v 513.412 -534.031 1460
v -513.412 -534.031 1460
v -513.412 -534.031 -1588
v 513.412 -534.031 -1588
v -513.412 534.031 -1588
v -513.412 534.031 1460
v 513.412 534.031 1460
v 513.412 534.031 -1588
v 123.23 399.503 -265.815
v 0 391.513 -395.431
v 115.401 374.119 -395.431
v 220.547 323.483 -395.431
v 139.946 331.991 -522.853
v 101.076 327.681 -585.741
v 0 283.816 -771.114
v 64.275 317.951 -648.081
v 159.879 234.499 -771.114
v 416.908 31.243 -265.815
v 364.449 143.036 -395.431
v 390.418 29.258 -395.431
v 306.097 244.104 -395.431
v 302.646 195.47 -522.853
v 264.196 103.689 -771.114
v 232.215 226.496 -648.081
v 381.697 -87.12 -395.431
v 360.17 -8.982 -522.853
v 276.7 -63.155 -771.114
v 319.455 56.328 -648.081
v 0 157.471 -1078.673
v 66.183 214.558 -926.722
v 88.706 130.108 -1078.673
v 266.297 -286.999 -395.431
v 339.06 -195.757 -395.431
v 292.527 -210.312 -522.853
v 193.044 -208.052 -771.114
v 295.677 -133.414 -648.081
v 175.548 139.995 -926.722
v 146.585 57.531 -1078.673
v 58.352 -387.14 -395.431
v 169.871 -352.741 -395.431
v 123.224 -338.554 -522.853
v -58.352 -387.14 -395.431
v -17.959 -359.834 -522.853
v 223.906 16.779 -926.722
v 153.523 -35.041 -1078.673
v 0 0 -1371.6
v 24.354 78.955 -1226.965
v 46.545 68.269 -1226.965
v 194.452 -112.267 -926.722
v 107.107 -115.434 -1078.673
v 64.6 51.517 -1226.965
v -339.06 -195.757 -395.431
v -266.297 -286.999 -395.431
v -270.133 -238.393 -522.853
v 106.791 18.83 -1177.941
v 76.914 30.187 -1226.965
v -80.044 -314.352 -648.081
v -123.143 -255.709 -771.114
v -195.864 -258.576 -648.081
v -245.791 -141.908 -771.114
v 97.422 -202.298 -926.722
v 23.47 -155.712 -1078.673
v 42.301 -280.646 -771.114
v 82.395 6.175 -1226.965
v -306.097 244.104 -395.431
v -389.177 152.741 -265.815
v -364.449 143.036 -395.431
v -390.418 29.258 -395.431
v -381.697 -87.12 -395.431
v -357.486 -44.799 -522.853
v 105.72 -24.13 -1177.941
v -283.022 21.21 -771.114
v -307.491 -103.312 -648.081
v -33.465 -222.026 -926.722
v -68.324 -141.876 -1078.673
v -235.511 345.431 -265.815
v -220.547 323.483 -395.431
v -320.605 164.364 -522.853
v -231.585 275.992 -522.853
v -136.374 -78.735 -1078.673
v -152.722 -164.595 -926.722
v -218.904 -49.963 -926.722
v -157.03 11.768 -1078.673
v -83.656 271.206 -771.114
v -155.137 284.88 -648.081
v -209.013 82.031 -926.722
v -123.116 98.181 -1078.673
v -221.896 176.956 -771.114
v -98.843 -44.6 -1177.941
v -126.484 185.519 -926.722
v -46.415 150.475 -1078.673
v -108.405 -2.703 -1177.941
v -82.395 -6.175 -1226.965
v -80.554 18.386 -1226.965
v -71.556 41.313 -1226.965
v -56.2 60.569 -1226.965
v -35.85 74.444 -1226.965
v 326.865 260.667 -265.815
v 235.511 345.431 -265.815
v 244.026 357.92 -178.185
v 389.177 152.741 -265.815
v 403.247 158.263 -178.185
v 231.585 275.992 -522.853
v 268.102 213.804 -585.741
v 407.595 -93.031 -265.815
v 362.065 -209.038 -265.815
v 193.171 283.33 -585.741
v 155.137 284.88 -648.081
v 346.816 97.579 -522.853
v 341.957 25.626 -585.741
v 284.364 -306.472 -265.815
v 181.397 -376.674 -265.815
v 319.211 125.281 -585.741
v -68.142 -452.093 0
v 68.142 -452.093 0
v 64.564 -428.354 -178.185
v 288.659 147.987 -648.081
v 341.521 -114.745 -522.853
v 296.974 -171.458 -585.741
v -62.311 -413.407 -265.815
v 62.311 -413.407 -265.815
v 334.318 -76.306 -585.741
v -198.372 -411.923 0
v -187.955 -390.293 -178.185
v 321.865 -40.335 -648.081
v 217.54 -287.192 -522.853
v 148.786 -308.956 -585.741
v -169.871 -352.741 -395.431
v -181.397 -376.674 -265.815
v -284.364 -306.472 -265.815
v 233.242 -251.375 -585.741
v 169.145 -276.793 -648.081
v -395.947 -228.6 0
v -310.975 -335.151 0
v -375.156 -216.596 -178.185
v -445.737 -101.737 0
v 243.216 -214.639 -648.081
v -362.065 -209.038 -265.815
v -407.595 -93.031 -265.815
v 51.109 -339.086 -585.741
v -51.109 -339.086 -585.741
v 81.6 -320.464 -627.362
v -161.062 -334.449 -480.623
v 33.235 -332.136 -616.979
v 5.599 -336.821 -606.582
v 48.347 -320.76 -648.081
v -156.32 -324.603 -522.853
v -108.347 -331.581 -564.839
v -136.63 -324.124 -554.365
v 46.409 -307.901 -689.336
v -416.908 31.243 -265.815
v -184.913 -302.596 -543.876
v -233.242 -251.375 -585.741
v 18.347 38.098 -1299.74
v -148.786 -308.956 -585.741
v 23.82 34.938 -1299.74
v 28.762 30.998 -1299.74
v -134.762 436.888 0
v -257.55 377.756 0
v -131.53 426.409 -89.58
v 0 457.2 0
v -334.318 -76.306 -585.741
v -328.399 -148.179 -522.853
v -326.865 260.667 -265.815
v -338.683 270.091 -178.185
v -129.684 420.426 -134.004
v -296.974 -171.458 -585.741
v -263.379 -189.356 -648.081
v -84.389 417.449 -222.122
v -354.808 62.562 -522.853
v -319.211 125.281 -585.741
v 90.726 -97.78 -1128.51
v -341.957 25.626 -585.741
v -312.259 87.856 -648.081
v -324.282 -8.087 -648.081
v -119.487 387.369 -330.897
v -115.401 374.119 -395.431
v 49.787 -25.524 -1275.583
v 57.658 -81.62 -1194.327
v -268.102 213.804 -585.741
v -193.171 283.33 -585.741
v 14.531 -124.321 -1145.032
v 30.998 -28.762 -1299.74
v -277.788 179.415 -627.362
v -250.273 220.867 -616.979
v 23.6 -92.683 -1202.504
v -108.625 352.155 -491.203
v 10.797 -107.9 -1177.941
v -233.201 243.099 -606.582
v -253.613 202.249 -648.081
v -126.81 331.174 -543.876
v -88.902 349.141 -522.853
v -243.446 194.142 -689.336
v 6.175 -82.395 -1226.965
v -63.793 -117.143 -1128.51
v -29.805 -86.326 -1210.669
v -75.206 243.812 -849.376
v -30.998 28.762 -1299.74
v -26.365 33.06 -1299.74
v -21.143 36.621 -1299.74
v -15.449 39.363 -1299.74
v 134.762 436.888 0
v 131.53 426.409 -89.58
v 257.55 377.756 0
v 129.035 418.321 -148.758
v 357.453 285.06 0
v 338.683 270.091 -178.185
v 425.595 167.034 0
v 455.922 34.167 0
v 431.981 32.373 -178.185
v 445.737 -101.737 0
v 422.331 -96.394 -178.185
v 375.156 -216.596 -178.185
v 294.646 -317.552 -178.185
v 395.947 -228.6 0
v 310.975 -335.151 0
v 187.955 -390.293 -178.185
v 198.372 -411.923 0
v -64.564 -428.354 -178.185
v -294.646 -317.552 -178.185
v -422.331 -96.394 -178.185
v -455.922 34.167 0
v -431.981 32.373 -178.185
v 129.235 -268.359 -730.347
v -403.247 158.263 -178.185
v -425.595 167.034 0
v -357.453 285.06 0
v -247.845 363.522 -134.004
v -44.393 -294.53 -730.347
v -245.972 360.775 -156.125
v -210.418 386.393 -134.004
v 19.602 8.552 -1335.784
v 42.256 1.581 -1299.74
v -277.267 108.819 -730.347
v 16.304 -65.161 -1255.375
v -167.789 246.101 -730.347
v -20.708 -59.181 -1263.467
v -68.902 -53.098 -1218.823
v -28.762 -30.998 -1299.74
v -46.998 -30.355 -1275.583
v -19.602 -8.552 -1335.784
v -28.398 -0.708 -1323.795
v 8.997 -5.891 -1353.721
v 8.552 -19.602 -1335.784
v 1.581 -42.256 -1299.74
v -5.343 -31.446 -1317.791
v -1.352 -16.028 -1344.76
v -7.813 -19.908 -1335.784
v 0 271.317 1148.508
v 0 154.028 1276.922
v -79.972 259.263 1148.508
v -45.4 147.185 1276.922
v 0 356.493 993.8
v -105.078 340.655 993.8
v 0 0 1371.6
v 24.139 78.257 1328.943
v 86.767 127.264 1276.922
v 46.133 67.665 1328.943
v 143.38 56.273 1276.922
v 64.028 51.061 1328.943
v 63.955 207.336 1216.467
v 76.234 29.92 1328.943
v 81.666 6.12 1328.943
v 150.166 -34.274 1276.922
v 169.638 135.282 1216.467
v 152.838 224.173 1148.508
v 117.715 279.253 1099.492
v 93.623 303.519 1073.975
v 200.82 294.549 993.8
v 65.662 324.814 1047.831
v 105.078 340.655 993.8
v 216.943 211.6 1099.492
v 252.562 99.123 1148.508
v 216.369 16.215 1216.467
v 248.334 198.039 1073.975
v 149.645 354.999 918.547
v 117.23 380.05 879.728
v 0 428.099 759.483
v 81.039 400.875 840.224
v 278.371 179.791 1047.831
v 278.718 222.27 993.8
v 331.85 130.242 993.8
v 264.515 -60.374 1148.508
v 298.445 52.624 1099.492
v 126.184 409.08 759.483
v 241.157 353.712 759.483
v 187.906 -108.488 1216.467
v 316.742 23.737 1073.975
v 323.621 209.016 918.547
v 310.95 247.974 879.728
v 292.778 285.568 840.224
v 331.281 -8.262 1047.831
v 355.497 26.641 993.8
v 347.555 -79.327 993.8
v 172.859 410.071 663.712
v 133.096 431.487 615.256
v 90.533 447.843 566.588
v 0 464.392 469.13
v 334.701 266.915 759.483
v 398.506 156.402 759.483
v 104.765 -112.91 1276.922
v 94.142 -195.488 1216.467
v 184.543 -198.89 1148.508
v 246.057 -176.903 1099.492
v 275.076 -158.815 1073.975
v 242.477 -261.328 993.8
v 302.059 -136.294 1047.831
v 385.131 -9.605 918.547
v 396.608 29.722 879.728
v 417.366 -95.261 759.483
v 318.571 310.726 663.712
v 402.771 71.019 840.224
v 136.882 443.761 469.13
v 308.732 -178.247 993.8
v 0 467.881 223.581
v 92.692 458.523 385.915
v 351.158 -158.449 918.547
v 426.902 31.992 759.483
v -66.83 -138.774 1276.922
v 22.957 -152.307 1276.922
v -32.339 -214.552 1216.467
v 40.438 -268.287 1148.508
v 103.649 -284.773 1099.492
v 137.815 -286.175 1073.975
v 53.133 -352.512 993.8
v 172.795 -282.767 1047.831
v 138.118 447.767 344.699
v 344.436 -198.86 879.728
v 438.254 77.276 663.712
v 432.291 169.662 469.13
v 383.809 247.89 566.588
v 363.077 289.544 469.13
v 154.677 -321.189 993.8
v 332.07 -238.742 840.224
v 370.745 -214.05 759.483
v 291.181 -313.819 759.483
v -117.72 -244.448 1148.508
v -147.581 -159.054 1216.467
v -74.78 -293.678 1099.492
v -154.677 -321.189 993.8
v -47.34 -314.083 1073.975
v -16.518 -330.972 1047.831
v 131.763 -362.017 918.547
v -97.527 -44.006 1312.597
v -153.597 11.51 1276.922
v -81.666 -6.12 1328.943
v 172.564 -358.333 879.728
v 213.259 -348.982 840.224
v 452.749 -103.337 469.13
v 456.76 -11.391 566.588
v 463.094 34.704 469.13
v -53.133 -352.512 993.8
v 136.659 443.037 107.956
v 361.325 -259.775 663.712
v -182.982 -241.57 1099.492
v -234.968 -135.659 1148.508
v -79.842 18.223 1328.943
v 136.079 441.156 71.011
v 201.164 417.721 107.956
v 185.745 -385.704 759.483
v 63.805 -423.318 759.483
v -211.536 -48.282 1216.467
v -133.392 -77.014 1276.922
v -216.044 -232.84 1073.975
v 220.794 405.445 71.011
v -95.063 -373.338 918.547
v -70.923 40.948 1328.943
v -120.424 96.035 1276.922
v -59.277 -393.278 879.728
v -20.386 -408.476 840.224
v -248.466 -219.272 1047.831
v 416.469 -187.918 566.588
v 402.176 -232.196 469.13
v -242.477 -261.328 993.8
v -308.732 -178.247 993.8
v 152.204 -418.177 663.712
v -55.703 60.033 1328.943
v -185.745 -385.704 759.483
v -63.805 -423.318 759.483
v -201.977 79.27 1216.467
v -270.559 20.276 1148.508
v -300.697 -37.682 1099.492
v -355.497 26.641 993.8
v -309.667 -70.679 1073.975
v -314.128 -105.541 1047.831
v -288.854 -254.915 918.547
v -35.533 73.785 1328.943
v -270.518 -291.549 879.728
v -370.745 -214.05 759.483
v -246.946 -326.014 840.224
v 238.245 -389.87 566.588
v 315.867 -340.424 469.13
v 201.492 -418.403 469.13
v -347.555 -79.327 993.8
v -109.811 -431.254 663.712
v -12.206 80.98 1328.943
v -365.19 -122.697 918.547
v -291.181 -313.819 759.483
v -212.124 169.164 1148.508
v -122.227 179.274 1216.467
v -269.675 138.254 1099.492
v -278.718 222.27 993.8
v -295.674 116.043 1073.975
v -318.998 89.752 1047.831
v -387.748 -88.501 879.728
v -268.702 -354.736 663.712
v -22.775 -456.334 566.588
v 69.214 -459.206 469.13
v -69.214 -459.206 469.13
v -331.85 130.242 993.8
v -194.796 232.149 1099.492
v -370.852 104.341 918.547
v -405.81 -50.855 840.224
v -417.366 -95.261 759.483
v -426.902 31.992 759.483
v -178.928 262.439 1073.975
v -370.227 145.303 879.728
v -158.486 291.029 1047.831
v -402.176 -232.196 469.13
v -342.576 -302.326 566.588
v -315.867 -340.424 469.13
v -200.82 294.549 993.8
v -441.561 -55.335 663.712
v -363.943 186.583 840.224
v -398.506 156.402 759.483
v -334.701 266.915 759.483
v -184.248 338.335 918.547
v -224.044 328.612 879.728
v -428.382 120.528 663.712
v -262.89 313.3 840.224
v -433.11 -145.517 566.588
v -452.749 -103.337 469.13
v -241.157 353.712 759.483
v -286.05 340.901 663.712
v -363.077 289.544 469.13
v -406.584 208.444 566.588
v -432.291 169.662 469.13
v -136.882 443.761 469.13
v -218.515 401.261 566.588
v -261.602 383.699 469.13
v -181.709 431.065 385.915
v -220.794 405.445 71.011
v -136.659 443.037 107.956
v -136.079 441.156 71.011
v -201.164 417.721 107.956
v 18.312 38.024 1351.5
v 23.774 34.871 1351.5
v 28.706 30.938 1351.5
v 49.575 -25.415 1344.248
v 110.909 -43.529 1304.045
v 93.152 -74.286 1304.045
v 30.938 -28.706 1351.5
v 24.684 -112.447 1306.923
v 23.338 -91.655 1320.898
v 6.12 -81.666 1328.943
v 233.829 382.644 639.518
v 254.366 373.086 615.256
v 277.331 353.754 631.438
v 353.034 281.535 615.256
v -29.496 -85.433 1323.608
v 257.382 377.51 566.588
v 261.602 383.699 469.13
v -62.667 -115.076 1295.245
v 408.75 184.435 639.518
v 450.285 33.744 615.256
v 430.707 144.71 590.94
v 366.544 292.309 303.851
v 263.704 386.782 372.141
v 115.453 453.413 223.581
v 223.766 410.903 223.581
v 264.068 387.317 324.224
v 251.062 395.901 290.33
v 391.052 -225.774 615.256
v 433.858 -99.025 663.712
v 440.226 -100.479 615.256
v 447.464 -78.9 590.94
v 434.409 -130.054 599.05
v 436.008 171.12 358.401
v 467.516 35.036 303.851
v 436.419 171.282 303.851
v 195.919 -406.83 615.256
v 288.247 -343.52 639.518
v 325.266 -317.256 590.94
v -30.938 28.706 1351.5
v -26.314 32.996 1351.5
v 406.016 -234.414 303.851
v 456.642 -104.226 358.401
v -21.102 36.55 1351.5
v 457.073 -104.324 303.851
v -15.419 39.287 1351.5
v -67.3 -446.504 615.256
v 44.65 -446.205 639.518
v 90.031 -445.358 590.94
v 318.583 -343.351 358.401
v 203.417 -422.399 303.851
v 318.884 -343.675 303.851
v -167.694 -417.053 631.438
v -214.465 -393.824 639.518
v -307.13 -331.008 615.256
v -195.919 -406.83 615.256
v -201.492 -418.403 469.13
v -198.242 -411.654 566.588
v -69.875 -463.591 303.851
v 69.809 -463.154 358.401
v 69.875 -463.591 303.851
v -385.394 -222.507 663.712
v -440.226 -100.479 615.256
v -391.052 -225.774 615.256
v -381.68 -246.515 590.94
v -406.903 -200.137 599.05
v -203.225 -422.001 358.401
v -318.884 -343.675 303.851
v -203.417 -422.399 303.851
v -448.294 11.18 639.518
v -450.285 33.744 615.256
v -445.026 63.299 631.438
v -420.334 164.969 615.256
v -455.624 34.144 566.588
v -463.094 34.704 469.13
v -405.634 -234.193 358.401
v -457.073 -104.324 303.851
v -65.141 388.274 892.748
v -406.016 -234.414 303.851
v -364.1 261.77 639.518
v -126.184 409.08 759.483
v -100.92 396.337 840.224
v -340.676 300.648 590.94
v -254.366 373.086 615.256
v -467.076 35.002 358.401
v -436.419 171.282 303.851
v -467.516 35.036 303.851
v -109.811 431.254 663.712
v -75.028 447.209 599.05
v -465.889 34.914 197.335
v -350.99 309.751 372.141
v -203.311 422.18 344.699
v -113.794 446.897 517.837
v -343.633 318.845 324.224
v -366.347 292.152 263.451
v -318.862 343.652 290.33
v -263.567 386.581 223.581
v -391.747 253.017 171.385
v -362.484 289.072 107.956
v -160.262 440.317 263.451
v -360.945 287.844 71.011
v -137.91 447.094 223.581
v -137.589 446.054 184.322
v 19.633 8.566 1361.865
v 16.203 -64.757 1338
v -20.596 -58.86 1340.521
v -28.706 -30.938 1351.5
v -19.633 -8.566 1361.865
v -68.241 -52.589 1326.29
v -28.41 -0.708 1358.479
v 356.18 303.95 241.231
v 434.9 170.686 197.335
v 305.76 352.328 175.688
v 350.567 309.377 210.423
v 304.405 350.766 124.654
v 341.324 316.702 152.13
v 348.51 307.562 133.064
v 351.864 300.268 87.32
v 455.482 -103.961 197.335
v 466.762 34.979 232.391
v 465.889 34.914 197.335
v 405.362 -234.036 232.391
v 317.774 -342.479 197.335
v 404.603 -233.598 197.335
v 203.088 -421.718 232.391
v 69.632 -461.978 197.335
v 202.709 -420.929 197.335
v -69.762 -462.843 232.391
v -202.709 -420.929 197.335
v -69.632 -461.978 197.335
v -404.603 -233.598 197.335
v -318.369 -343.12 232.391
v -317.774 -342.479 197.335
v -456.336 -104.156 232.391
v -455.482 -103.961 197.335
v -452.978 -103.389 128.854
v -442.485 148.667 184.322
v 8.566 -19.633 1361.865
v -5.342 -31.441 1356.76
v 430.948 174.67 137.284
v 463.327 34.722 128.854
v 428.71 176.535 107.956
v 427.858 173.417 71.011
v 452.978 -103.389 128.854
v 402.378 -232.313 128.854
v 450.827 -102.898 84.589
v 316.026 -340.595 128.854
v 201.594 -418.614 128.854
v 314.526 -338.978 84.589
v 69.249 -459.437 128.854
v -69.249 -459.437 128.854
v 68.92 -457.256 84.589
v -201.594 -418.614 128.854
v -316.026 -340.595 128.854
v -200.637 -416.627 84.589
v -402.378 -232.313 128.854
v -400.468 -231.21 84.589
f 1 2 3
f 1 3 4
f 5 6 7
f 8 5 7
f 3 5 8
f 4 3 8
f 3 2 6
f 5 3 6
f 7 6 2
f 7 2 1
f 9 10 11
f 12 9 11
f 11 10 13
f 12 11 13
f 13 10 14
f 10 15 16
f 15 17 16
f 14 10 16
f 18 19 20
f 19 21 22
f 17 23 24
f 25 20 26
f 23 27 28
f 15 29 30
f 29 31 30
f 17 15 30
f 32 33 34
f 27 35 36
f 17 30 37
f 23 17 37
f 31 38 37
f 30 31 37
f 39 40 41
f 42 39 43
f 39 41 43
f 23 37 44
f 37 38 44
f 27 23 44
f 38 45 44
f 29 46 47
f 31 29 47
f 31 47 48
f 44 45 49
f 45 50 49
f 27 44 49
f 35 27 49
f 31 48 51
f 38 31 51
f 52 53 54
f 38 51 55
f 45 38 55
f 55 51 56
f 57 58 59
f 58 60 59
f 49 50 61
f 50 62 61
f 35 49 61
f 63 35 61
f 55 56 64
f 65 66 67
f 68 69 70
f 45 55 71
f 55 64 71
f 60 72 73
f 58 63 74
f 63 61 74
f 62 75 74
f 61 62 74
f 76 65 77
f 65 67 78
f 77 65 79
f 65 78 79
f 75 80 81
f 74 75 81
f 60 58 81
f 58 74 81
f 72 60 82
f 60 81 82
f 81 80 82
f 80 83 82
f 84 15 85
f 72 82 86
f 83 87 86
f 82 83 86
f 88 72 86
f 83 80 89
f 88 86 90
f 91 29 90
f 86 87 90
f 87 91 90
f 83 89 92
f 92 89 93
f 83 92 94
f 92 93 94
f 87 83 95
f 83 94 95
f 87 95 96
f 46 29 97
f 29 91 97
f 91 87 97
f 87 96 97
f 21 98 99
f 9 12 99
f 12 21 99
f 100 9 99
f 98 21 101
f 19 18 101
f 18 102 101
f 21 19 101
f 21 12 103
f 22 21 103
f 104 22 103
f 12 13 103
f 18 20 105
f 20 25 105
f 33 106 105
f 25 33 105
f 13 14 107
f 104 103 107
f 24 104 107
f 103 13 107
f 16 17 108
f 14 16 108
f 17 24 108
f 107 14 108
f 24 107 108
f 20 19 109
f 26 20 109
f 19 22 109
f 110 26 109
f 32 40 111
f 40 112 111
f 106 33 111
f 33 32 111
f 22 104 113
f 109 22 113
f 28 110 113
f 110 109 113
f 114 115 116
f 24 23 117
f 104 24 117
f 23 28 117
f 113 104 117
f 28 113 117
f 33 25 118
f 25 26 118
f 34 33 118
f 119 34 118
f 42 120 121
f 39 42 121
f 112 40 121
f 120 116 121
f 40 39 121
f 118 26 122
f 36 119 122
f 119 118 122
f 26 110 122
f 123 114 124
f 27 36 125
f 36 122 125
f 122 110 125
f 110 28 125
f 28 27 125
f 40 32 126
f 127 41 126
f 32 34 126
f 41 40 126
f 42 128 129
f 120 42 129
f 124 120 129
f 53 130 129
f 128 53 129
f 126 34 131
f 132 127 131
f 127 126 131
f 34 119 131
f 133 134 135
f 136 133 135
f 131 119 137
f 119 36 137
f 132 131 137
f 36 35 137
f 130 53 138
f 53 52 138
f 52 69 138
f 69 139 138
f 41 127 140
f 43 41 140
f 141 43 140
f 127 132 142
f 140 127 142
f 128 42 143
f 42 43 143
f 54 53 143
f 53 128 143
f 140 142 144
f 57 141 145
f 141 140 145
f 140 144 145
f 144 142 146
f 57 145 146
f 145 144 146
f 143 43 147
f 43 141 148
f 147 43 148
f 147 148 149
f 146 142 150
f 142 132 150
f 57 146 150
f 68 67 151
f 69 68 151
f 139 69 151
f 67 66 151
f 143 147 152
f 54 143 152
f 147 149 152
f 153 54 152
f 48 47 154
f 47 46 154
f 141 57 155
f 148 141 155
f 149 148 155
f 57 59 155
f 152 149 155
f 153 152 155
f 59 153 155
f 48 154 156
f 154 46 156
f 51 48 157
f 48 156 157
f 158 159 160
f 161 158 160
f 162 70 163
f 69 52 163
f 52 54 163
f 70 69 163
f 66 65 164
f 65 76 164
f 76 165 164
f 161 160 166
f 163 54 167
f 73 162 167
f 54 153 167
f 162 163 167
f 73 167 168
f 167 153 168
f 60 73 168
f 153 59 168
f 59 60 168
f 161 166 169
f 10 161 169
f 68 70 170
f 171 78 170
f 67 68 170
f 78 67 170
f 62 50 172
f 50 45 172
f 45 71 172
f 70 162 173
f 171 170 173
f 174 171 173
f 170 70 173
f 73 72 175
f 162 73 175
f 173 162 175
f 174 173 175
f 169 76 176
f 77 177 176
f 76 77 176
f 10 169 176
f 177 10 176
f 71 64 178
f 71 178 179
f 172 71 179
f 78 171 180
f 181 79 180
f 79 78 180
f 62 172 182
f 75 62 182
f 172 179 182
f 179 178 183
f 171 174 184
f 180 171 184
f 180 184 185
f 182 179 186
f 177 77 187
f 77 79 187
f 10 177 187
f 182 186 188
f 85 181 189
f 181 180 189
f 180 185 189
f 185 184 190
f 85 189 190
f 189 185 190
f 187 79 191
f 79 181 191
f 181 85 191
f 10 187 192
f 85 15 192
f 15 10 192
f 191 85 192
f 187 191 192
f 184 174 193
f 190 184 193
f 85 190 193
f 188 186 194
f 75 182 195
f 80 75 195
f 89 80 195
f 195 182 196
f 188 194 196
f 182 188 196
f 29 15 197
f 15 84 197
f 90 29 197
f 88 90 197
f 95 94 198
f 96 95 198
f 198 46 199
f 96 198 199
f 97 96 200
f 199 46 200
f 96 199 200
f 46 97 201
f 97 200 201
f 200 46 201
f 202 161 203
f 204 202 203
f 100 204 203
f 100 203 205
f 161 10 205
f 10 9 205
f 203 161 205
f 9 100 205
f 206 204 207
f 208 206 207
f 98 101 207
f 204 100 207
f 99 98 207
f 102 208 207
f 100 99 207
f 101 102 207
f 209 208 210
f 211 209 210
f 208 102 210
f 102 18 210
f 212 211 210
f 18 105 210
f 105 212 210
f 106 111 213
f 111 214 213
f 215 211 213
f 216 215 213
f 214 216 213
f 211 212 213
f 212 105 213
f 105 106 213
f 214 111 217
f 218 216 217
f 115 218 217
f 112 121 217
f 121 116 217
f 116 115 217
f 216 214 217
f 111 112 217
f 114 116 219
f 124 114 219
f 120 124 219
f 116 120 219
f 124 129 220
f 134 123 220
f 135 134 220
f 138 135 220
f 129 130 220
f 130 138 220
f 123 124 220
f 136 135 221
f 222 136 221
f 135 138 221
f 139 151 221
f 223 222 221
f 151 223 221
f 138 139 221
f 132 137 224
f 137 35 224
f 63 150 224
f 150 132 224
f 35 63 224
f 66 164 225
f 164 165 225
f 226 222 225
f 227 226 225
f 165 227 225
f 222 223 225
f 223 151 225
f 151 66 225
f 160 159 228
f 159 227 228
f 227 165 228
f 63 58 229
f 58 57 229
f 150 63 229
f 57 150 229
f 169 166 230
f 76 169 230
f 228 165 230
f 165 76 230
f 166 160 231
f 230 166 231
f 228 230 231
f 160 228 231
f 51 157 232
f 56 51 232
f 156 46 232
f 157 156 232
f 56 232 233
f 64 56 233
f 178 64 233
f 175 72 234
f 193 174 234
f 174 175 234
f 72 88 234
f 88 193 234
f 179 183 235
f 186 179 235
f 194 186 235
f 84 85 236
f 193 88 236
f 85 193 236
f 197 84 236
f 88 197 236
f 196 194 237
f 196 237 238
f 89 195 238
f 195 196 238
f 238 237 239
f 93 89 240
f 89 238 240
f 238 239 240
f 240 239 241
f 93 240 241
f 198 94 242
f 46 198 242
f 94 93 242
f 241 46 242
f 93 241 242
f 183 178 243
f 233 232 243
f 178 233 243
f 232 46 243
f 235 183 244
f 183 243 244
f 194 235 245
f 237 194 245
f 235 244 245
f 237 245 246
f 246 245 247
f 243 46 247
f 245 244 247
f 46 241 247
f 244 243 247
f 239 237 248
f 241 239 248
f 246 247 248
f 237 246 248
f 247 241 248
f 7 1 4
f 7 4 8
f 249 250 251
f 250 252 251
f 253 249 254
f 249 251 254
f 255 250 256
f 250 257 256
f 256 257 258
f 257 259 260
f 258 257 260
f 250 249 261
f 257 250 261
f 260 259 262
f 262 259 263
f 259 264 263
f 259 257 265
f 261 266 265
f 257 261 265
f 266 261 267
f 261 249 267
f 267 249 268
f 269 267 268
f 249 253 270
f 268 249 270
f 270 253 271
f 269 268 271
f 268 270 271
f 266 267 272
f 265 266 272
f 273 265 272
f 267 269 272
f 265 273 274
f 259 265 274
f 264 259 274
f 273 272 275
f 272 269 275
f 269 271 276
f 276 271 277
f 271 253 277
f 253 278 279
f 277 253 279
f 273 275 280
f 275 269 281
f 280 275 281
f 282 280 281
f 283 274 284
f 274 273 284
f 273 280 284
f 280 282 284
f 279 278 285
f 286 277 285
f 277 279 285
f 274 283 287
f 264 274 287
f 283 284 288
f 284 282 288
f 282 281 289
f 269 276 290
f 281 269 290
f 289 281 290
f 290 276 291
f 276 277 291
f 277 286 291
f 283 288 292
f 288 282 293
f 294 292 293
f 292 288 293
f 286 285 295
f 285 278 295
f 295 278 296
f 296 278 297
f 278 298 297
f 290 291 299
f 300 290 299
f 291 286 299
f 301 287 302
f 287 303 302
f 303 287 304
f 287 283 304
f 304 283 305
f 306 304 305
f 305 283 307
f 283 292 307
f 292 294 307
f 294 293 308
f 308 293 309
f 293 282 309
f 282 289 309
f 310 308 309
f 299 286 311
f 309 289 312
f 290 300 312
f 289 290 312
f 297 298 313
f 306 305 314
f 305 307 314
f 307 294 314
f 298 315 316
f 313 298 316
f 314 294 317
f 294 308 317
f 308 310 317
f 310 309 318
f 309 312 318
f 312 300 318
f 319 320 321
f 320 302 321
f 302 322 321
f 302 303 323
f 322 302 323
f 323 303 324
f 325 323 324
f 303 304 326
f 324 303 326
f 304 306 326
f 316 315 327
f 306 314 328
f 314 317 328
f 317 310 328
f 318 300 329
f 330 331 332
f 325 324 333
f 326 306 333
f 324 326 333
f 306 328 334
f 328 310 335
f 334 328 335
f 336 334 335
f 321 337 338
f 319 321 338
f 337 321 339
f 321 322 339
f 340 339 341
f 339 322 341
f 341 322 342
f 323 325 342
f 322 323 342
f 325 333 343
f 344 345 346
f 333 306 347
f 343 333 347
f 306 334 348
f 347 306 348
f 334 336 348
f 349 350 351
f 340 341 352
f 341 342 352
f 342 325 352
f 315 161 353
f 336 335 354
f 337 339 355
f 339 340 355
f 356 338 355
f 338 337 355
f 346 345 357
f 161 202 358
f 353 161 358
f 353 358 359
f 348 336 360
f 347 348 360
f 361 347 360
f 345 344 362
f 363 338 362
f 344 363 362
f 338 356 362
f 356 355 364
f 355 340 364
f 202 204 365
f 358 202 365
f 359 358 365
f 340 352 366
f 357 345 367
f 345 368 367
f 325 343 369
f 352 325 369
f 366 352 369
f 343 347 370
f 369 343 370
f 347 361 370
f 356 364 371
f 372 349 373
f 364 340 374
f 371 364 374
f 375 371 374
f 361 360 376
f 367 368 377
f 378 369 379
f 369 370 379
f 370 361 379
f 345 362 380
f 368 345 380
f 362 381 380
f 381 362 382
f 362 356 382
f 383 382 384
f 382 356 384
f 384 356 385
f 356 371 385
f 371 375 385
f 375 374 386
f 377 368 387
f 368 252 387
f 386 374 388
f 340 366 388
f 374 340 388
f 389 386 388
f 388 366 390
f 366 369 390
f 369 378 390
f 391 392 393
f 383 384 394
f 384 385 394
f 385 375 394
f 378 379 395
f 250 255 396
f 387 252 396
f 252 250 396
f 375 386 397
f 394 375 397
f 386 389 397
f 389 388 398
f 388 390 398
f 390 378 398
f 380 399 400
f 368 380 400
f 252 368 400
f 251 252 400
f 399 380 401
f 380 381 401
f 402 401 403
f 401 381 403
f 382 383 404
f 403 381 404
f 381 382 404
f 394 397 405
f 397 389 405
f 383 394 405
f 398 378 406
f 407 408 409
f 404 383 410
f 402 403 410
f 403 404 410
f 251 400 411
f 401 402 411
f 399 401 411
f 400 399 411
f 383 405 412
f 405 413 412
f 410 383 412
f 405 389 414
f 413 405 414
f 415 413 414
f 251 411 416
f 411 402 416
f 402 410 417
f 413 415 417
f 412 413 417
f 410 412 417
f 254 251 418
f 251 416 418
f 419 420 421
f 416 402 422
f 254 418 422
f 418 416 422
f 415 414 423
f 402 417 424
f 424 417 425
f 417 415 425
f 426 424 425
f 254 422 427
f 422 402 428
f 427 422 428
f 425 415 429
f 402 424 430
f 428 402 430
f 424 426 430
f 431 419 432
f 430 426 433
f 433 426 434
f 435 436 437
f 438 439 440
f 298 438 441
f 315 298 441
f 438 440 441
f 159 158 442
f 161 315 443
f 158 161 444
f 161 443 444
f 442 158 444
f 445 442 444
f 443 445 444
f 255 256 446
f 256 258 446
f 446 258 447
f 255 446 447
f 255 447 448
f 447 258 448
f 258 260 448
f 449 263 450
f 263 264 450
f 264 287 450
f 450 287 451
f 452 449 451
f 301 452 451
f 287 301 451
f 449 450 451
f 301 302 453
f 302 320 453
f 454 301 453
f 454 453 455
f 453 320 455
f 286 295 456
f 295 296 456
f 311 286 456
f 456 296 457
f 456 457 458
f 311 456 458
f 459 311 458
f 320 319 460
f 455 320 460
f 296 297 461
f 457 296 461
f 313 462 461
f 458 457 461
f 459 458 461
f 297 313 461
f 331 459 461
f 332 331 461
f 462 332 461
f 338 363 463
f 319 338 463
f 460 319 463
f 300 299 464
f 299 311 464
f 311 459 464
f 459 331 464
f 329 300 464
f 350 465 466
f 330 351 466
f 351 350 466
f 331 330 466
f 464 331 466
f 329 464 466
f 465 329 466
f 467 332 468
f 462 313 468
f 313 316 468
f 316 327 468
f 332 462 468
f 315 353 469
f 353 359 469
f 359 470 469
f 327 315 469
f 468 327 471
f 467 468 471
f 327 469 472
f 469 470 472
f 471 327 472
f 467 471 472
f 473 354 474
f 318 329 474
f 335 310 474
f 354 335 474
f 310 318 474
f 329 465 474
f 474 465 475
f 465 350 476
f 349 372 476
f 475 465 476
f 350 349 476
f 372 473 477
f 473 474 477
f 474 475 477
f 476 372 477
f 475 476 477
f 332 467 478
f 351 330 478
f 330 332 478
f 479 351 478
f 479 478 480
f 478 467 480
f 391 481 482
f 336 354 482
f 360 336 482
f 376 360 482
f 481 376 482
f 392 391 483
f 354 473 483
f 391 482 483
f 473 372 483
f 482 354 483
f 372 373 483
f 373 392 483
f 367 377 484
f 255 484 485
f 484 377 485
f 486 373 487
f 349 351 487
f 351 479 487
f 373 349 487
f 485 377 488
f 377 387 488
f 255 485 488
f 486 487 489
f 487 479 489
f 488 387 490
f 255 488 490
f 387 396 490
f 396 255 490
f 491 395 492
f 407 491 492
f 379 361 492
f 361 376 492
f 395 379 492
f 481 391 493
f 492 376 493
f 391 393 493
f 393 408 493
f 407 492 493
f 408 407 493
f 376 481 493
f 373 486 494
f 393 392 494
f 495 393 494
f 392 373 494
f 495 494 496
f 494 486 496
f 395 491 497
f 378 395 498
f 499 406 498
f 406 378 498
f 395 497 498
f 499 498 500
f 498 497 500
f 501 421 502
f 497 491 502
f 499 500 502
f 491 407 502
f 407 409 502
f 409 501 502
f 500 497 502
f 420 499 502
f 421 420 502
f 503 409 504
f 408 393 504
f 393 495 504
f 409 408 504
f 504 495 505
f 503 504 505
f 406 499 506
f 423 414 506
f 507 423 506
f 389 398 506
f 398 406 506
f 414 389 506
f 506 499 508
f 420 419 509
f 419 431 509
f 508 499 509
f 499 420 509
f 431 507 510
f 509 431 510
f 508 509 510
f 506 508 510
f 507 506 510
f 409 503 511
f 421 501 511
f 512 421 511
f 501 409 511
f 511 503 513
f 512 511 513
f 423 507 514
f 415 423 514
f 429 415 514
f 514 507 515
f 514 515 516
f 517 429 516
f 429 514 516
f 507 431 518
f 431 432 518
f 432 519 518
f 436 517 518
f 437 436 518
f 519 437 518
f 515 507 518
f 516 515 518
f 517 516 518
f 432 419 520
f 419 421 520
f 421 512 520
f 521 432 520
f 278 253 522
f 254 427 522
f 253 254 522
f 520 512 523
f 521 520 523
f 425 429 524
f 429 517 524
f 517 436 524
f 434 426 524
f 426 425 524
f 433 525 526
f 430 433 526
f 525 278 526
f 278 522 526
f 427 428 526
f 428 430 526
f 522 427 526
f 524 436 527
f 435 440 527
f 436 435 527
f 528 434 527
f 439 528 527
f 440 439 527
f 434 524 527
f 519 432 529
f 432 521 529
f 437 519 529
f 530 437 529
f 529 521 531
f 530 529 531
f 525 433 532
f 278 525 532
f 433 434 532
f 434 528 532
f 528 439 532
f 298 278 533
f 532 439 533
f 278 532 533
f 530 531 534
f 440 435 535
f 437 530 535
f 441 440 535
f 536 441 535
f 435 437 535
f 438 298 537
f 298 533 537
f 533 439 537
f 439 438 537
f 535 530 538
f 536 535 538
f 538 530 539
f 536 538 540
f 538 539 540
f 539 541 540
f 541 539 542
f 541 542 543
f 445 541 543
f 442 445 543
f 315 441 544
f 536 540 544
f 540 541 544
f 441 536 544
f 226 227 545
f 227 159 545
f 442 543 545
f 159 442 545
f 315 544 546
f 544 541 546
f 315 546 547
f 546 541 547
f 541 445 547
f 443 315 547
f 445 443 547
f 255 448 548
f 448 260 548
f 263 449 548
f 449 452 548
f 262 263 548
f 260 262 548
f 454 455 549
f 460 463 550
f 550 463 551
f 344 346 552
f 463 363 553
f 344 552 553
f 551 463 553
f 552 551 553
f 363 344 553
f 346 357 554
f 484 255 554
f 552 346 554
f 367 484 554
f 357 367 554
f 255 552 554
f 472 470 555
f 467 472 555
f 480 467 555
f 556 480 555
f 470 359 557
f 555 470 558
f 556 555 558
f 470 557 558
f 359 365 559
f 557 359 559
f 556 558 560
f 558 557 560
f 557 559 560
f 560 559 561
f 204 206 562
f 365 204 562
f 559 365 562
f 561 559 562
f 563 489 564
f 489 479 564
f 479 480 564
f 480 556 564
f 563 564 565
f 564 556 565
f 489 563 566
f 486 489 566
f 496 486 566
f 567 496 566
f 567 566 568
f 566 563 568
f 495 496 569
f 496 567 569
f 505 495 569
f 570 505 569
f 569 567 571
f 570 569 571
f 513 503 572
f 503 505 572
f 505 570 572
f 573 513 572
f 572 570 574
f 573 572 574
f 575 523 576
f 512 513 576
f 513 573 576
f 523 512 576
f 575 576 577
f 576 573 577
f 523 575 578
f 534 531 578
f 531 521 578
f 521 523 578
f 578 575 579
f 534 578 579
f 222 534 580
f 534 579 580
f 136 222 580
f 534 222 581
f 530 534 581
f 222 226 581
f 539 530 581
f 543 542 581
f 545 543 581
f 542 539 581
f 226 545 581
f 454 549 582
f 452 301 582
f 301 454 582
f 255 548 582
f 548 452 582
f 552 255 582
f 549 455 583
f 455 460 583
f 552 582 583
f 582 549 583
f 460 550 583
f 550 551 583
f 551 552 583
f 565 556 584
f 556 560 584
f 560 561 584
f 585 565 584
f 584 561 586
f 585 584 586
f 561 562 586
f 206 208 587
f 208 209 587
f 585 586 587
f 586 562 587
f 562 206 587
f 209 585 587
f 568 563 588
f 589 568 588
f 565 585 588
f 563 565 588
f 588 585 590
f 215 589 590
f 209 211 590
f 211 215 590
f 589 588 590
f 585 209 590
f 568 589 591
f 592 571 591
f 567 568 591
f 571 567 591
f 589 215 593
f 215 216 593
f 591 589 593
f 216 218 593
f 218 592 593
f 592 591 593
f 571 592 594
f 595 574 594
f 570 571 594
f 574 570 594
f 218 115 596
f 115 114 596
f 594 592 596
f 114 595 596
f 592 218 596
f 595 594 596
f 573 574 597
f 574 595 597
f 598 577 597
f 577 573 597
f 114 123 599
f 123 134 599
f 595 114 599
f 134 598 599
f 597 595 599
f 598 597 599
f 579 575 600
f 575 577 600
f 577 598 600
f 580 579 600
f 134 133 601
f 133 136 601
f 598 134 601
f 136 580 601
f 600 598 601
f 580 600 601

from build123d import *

# Parameters (mm, degrees)
SKETCH3_W           = 1026.824977428
SKETCH3_H           = 1068.062223586
BOSS_EXTRUDE2_DEPTH = 3048


with BuildPart() as part:
    # Sketch2 → Revolve1 (revolve)
    with BuildSketch(Plane(origin=(0, 0, 0), x_dir=(0, 0, -1), z_dir=(1, 0, 0))):
        with BuildLine():
            Line((-1371.6, 0), (1371.6, 0))
            add(Edge.make_bspline(
                [(0, 457.2), (754.172424681, 374.058740476), (1371.6, 0)],
                knots=[0, 0, 0, 0.947101695, 0.947101695, 0.947101695], degree=2))
            add(Edge.make_bspline(
                [(-1371.6, 0), (-1157.286468217, 494.854511367), (-443.029223323, 487.528566422), (0, 457.2)],
                knots=[0, 0, 0, 0, 1, 1, 1, 1], degree=3))
        make_face()
    revolve(axis=Axis((0, 0, 1371.6), (0, 0, -1)))


with BuildPart() as body_2:
    # Sketch3 → Boss-Extrude2 (new body)
    with BuildSketch(Plane.XY.offset(1460)):
        Rectangle(SKETCH3_W, SKETCH3_H)
    extrude(amount=-BOSS_EXTRUDE2_DEPTH)

    # Combine1: cut part
    add(part.part, mode=Mode.SUBTRACT)


solid = body_2.part
